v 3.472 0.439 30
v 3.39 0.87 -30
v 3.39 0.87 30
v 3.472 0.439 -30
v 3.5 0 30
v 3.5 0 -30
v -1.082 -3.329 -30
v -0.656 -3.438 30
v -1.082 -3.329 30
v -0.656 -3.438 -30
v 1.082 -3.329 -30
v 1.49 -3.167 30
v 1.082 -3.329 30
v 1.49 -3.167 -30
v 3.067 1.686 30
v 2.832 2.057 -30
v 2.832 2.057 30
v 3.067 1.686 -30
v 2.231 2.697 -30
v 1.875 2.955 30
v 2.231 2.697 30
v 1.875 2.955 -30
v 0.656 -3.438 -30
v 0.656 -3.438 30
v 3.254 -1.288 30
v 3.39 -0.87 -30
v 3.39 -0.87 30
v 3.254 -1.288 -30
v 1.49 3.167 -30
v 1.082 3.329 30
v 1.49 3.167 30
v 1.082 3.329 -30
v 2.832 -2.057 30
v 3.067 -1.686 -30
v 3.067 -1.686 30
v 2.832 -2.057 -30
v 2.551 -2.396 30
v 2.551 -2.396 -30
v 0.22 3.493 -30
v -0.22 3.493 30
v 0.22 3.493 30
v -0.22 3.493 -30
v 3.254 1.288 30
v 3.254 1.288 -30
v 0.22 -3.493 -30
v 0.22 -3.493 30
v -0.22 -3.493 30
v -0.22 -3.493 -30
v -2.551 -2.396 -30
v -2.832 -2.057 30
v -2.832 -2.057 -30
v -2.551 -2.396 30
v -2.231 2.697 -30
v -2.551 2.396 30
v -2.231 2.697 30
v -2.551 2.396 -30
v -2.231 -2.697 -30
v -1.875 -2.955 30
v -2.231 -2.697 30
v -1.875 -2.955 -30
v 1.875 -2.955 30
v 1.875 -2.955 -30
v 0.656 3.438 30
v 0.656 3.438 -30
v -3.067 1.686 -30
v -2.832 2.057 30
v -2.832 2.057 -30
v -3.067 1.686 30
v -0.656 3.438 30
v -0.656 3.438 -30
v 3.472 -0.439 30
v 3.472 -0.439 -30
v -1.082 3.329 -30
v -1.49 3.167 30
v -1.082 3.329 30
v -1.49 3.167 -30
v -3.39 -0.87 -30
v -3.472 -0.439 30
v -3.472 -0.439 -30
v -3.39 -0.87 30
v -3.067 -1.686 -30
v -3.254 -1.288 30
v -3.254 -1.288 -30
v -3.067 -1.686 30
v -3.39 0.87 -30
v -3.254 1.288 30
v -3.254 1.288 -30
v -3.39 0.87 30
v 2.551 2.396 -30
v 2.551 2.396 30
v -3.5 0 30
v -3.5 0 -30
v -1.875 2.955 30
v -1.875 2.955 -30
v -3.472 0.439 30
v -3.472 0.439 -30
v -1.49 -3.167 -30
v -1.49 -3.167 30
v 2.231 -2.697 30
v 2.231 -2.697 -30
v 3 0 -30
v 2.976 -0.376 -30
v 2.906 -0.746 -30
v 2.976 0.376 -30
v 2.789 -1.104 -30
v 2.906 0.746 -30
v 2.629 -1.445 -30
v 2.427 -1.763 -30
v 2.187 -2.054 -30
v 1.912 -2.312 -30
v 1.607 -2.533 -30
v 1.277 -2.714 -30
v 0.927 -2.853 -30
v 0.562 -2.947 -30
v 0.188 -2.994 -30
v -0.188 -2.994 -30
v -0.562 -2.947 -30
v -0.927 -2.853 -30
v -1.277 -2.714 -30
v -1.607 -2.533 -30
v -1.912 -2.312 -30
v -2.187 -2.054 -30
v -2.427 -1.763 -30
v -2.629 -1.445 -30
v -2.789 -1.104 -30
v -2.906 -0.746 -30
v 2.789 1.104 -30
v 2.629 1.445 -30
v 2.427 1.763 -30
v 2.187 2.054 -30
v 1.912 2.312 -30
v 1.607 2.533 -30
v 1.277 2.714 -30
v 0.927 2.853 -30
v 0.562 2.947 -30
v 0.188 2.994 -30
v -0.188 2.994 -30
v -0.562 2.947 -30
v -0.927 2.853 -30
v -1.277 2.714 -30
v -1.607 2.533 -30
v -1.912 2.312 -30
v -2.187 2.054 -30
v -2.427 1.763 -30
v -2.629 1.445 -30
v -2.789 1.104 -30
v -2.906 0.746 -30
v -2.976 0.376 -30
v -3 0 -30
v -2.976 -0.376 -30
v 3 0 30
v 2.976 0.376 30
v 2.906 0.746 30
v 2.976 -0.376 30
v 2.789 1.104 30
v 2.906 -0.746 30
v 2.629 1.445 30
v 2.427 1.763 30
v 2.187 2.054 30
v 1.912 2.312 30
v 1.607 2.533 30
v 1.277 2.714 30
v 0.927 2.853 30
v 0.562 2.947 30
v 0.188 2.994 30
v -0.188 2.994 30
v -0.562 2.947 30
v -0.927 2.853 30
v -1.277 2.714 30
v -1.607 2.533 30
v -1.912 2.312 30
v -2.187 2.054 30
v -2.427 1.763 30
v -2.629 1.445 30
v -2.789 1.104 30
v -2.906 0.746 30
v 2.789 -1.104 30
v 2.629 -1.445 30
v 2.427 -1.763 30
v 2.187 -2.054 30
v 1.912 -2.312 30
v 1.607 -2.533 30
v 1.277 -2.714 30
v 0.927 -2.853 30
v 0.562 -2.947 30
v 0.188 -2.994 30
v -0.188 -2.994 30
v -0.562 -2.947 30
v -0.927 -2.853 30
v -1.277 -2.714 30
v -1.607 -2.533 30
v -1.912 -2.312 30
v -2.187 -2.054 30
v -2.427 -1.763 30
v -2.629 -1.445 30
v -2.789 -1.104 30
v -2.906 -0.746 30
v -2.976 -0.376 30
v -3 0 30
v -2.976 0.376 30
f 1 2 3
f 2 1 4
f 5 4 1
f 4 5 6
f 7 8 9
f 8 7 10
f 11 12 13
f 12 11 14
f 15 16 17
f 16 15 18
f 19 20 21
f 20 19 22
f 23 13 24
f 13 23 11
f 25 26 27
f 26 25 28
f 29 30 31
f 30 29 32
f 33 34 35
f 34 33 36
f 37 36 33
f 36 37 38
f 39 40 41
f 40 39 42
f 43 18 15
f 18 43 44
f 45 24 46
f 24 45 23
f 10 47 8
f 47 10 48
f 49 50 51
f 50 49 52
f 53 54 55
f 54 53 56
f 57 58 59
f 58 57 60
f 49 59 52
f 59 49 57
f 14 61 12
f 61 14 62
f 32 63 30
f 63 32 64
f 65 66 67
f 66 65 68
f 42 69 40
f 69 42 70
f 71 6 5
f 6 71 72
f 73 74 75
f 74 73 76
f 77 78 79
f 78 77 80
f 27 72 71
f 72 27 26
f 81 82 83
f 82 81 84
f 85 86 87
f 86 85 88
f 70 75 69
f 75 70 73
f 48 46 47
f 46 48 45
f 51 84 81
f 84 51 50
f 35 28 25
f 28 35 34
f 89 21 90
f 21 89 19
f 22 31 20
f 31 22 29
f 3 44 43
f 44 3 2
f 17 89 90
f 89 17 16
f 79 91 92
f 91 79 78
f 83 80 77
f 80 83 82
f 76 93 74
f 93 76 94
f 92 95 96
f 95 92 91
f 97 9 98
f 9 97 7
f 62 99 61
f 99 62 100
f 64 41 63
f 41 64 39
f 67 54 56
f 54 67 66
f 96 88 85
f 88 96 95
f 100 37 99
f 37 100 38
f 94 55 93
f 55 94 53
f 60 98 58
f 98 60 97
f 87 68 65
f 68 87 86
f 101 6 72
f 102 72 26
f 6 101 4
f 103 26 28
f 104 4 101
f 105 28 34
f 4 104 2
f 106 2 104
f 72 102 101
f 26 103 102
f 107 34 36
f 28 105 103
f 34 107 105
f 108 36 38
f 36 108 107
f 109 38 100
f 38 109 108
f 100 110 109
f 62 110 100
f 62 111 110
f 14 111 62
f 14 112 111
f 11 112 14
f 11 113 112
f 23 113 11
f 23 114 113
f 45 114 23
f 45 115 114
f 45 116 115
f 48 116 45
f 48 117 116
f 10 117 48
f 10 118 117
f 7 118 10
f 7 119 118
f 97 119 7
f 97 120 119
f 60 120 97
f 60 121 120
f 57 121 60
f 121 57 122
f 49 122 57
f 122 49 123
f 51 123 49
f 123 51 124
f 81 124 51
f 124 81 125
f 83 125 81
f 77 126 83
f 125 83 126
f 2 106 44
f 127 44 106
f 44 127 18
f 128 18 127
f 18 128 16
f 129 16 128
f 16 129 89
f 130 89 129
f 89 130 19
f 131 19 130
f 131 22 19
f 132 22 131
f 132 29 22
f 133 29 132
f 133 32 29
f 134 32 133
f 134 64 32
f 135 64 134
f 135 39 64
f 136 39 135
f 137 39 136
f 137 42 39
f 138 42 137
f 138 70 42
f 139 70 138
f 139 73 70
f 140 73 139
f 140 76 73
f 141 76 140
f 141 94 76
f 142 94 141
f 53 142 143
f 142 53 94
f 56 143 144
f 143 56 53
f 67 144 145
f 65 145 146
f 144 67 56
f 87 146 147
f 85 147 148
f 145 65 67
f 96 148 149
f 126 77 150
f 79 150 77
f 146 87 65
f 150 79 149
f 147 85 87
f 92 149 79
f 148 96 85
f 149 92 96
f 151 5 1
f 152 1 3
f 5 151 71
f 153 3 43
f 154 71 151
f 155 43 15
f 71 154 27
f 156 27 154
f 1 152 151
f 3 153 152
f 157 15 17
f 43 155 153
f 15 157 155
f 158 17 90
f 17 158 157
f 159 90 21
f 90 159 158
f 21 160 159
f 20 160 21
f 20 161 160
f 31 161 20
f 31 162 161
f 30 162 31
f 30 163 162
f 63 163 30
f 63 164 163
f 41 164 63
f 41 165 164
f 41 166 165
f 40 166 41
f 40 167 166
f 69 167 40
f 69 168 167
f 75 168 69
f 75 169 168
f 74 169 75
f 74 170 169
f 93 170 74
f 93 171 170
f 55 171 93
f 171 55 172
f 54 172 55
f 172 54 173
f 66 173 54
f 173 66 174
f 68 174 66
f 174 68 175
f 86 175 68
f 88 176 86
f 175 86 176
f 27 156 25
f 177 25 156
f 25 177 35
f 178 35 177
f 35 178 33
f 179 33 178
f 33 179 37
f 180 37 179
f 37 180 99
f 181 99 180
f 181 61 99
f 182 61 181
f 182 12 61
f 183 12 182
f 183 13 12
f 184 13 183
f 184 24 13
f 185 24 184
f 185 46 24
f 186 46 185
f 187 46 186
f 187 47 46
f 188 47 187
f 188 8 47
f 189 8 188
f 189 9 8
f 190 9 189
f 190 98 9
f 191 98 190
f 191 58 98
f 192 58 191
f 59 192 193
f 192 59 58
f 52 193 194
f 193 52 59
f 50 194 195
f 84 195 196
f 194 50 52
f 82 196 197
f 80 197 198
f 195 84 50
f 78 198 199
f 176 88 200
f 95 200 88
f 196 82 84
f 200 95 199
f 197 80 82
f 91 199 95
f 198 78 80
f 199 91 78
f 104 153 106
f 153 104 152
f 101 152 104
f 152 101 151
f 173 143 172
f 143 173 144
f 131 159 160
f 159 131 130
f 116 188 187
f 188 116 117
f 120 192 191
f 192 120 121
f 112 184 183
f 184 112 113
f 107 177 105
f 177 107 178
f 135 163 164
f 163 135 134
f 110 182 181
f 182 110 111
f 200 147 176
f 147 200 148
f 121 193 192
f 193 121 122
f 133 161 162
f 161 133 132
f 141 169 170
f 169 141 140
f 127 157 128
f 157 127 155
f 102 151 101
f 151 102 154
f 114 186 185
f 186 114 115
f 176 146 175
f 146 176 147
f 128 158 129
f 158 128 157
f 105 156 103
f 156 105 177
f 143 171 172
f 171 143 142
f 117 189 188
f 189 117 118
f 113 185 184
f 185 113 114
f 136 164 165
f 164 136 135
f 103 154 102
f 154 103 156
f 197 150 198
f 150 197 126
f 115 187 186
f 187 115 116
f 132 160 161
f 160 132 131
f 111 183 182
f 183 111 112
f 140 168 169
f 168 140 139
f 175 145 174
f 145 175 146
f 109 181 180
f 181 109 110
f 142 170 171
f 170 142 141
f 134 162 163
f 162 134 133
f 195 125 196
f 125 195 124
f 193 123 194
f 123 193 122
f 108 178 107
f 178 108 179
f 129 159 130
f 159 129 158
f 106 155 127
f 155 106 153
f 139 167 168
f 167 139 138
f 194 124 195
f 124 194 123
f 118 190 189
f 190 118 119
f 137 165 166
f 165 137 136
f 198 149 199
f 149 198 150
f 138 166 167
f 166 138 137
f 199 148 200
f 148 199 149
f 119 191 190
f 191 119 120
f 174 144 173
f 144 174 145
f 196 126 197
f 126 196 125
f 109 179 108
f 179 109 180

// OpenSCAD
$fn = 50;


difference() {
	union() {
		translate(v = [0, 0, -30.0000000000]) {
			cylinder(h = 60, r = 3.5000000000);
		}
	}
	union() {
		translate(v = [0, 0, -100.0000000000]) {
			cylinder(h = 200, r = 3.0000000000);
		}
	}
}
